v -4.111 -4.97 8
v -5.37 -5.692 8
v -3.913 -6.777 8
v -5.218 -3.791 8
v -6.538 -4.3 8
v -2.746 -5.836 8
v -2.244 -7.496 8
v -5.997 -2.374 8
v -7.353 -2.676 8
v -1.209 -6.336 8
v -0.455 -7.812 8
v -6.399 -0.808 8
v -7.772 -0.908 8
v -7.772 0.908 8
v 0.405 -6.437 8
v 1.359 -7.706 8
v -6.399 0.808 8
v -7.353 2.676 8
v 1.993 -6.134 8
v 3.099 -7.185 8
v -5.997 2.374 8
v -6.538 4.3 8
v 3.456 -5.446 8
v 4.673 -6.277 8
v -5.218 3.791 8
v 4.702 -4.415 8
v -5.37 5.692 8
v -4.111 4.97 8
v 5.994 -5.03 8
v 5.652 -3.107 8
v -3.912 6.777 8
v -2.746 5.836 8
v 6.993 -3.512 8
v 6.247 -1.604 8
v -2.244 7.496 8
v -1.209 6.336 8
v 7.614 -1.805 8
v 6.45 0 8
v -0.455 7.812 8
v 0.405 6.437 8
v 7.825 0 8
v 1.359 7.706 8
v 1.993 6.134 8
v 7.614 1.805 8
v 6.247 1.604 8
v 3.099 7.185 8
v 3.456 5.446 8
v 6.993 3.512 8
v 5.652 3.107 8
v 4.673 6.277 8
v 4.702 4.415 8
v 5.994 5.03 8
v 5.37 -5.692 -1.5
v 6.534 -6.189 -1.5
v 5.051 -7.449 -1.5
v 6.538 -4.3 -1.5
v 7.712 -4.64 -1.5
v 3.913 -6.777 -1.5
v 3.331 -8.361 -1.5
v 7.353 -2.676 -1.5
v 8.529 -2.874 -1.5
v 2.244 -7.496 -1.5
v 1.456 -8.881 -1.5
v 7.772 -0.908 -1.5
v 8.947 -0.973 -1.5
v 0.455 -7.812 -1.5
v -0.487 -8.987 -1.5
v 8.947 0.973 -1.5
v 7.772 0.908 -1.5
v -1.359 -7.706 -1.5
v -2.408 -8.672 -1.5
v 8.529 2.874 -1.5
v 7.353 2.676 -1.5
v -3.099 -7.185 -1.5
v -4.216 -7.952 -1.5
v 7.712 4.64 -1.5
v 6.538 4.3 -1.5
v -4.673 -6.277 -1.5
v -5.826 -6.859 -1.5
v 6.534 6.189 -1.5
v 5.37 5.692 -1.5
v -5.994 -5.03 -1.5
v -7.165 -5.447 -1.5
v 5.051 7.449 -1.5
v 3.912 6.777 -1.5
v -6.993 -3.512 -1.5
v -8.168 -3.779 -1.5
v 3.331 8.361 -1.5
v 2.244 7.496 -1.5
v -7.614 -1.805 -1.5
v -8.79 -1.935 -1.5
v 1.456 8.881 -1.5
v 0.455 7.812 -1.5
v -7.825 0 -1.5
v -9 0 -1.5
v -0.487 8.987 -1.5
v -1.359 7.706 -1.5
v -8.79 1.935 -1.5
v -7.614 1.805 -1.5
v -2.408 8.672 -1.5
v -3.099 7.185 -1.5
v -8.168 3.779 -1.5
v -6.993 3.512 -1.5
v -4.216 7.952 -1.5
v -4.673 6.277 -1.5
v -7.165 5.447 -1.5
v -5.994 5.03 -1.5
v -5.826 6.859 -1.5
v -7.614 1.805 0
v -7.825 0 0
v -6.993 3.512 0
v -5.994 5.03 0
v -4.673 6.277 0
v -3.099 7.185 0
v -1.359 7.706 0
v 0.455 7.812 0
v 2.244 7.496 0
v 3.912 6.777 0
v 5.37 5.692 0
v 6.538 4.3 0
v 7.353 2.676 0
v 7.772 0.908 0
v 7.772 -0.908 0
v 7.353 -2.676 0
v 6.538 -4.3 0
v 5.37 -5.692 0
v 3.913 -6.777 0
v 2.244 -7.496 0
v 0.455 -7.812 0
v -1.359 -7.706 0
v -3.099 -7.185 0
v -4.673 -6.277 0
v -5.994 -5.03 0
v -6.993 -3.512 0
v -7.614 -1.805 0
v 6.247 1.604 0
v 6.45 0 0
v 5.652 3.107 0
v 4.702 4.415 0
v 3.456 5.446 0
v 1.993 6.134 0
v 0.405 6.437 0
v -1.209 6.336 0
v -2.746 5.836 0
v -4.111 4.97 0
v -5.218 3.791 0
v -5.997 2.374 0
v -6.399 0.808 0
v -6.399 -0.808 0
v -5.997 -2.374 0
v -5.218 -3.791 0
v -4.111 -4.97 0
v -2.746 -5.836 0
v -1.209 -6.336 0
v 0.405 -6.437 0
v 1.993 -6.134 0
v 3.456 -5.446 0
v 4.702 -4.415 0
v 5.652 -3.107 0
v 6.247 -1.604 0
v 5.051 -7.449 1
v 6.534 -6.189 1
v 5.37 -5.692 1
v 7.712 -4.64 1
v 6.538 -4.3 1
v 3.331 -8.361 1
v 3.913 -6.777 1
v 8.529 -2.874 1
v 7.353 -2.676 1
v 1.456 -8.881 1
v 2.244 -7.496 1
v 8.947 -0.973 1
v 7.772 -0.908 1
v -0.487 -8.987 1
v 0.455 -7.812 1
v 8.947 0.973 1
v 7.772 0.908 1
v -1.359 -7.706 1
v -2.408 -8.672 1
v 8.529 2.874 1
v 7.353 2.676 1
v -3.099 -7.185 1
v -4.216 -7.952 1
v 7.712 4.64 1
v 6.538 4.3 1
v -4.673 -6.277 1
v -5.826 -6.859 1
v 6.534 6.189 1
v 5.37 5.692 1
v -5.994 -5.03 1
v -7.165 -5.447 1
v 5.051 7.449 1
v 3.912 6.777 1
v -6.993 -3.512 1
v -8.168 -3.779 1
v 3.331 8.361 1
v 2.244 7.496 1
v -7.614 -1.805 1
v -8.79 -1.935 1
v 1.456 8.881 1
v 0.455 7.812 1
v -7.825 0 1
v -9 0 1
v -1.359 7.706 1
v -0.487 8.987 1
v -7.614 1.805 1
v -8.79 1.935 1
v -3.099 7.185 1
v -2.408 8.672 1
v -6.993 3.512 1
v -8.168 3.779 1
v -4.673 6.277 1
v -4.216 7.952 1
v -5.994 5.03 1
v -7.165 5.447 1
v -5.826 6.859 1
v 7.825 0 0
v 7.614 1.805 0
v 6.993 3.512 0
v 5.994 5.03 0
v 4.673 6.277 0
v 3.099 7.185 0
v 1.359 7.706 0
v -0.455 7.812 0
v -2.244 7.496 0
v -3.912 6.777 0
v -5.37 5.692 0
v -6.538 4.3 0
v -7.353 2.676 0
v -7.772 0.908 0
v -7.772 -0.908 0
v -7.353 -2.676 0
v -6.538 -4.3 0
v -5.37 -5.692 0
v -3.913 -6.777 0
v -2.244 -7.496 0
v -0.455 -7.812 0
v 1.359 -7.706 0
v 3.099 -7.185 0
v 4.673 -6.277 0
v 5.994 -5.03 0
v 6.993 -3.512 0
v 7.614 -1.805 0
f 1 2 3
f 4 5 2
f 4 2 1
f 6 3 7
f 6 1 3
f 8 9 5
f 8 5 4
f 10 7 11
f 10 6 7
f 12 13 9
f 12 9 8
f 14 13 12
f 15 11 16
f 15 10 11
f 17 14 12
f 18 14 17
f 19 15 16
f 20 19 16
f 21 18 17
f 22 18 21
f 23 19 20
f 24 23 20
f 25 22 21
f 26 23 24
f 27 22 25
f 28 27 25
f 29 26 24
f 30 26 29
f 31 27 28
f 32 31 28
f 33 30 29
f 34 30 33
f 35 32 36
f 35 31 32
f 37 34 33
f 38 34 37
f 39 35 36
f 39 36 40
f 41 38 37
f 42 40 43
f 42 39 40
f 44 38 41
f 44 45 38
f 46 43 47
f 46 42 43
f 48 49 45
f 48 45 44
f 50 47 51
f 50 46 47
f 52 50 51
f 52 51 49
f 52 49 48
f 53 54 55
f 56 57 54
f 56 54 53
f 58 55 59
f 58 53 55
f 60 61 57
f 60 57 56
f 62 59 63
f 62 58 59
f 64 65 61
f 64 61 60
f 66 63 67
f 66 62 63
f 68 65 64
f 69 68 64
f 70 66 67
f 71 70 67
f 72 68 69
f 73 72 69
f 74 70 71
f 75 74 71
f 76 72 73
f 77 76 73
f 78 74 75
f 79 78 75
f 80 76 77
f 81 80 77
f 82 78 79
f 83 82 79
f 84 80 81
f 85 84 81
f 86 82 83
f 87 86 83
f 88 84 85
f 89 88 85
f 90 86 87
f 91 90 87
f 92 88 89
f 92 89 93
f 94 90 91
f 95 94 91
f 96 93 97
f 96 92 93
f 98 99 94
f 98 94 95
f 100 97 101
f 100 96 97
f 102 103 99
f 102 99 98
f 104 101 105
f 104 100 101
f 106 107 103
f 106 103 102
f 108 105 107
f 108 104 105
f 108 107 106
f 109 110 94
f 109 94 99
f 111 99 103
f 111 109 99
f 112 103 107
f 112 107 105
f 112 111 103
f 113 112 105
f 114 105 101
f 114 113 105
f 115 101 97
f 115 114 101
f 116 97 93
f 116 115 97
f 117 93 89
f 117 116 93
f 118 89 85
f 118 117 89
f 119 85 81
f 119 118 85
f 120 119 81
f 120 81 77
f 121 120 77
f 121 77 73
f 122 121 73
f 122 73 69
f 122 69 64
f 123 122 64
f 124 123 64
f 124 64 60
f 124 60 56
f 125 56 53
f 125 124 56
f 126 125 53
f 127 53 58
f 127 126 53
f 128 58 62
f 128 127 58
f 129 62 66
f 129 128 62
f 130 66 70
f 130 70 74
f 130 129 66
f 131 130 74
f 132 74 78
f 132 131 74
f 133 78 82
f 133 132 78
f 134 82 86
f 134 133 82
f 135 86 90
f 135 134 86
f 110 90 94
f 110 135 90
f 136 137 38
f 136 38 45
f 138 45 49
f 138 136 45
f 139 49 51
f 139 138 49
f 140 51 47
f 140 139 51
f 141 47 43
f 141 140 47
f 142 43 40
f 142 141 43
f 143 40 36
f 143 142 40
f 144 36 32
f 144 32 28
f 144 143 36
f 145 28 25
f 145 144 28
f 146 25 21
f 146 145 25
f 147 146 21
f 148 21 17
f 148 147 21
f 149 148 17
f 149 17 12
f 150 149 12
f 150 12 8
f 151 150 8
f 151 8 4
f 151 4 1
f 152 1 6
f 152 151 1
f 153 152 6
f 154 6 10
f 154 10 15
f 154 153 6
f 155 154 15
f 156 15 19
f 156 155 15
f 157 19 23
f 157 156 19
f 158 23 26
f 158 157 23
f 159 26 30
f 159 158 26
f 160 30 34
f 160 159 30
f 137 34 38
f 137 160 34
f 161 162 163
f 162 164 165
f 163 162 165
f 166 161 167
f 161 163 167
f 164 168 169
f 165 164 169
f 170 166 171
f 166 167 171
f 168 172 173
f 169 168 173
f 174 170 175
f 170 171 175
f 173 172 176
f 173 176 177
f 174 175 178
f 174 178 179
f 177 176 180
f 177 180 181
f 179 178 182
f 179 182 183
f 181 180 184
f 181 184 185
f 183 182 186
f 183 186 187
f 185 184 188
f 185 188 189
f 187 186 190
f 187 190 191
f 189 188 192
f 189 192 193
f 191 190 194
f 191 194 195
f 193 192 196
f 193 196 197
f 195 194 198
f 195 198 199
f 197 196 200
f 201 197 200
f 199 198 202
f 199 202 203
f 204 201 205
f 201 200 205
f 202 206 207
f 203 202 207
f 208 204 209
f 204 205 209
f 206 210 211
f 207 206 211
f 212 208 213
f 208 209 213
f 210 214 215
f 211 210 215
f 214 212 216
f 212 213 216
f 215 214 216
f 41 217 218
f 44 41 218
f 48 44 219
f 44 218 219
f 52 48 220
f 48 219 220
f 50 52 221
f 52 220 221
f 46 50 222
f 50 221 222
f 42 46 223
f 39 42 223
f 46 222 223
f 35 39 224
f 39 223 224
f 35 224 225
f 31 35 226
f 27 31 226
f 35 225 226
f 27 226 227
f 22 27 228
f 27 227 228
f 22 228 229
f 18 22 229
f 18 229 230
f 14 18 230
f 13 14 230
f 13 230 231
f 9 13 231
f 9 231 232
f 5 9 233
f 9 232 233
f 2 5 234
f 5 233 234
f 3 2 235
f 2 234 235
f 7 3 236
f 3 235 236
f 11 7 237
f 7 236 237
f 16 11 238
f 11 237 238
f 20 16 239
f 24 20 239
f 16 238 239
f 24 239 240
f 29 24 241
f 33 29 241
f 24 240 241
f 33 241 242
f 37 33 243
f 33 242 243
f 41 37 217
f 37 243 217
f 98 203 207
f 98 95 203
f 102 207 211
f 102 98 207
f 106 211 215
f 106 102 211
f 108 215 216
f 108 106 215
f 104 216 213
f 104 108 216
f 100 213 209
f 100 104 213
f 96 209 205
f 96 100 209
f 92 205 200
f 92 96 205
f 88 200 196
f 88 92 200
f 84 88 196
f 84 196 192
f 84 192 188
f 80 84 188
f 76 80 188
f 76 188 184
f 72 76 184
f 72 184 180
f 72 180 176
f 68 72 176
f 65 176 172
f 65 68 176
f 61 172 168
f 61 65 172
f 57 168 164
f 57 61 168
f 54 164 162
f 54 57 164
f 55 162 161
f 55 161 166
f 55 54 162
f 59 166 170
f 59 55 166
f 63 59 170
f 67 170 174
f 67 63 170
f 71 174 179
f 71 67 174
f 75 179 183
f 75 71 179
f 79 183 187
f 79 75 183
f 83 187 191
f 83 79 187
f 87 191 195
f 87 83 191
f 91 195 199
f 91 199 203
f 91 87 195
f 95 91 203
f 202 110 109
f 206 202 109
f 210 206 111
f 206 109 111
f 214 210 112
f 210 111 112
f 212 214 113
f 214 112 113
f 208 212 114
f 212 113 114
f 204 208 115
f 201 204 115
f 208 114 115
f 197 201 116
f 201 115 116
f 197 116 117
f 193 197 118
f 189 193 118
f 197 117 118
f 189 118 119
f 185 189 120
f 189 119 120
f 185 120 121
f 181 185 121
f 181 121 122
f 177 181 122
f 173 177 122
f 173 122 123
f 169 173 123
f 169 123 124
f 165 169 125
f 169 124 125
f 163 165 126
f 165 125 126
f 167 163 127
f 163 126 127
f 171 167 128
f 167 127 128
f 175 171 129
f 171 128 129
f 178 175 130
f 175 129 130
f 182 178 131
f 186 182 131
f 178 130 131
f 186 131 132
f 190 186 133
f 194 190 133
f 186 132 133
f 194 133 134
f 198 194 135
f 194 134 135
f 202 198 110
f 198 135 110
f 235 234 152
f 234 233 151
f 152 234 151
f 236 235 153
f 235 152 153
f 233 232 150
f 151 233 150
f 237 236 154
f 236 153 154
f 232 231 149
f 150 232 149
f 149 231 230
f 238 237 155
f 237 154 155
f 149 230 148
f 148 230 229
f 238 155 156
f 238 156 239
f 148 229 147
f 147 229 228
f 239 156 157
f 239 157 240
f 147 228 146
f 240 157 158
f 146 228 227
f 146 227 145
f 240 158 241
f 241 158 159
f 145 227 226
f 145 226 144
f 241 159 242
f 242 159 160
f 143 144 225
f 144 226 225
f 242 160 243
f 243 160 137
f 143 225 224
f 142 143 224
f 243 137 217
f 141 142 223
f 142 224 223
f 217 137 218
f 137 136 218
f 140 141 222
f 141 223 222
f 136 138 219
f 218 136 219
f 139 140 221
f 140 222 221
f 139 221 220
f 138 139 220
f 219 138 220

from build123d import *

# Parameters (mm, degrees)
SKETCH1_R                = 7.825
SKETCH1_R_2              = 6.45
BOSS_EXTRUDE1_DEPTH      = 8
SKETCH2_R                = 9
SKETCH2_R_2              = 7.825
BOSS_EXTRUDE2_DEPTH      = 1.5
BOSS_EXTRUDE2_DEPTH_BACK = 1


with BuildPart() as part:
    # Sketch1 → Boss-Extrude1 (new body)
    with BuildSketch(Plane.XY):
        Circle(SKETCH1_R)
        Circle(SKETCH1_R_2, mode=Mode.SUBTRACT)
    extrude(amount=BOSS_EXTRUDE1_DEPTH)


with BuildPart() as body_2:
    # Sketch2 → Boss-Extrude2 (new body, two sides)
    with BuildSketch(Plane(origin=(0, 0, 0), x_dir=(-1, 0, 0), z_dir=(0, 0, -1))) as boss_extrude2_sk:
        Circle(SKETCH2_R)
        Circle(SKETCH2_R_2, mode=Mode.SUBTRACT)
    extrude(amount=BOSS_EXTRUDE2_DEPTH)
    extrude(boss_extrude2_sk.sketch, amount=-BOSS_EXTRUDE2_DEPTH_BACK)


solid = Compound([part.part, body_2.part])
